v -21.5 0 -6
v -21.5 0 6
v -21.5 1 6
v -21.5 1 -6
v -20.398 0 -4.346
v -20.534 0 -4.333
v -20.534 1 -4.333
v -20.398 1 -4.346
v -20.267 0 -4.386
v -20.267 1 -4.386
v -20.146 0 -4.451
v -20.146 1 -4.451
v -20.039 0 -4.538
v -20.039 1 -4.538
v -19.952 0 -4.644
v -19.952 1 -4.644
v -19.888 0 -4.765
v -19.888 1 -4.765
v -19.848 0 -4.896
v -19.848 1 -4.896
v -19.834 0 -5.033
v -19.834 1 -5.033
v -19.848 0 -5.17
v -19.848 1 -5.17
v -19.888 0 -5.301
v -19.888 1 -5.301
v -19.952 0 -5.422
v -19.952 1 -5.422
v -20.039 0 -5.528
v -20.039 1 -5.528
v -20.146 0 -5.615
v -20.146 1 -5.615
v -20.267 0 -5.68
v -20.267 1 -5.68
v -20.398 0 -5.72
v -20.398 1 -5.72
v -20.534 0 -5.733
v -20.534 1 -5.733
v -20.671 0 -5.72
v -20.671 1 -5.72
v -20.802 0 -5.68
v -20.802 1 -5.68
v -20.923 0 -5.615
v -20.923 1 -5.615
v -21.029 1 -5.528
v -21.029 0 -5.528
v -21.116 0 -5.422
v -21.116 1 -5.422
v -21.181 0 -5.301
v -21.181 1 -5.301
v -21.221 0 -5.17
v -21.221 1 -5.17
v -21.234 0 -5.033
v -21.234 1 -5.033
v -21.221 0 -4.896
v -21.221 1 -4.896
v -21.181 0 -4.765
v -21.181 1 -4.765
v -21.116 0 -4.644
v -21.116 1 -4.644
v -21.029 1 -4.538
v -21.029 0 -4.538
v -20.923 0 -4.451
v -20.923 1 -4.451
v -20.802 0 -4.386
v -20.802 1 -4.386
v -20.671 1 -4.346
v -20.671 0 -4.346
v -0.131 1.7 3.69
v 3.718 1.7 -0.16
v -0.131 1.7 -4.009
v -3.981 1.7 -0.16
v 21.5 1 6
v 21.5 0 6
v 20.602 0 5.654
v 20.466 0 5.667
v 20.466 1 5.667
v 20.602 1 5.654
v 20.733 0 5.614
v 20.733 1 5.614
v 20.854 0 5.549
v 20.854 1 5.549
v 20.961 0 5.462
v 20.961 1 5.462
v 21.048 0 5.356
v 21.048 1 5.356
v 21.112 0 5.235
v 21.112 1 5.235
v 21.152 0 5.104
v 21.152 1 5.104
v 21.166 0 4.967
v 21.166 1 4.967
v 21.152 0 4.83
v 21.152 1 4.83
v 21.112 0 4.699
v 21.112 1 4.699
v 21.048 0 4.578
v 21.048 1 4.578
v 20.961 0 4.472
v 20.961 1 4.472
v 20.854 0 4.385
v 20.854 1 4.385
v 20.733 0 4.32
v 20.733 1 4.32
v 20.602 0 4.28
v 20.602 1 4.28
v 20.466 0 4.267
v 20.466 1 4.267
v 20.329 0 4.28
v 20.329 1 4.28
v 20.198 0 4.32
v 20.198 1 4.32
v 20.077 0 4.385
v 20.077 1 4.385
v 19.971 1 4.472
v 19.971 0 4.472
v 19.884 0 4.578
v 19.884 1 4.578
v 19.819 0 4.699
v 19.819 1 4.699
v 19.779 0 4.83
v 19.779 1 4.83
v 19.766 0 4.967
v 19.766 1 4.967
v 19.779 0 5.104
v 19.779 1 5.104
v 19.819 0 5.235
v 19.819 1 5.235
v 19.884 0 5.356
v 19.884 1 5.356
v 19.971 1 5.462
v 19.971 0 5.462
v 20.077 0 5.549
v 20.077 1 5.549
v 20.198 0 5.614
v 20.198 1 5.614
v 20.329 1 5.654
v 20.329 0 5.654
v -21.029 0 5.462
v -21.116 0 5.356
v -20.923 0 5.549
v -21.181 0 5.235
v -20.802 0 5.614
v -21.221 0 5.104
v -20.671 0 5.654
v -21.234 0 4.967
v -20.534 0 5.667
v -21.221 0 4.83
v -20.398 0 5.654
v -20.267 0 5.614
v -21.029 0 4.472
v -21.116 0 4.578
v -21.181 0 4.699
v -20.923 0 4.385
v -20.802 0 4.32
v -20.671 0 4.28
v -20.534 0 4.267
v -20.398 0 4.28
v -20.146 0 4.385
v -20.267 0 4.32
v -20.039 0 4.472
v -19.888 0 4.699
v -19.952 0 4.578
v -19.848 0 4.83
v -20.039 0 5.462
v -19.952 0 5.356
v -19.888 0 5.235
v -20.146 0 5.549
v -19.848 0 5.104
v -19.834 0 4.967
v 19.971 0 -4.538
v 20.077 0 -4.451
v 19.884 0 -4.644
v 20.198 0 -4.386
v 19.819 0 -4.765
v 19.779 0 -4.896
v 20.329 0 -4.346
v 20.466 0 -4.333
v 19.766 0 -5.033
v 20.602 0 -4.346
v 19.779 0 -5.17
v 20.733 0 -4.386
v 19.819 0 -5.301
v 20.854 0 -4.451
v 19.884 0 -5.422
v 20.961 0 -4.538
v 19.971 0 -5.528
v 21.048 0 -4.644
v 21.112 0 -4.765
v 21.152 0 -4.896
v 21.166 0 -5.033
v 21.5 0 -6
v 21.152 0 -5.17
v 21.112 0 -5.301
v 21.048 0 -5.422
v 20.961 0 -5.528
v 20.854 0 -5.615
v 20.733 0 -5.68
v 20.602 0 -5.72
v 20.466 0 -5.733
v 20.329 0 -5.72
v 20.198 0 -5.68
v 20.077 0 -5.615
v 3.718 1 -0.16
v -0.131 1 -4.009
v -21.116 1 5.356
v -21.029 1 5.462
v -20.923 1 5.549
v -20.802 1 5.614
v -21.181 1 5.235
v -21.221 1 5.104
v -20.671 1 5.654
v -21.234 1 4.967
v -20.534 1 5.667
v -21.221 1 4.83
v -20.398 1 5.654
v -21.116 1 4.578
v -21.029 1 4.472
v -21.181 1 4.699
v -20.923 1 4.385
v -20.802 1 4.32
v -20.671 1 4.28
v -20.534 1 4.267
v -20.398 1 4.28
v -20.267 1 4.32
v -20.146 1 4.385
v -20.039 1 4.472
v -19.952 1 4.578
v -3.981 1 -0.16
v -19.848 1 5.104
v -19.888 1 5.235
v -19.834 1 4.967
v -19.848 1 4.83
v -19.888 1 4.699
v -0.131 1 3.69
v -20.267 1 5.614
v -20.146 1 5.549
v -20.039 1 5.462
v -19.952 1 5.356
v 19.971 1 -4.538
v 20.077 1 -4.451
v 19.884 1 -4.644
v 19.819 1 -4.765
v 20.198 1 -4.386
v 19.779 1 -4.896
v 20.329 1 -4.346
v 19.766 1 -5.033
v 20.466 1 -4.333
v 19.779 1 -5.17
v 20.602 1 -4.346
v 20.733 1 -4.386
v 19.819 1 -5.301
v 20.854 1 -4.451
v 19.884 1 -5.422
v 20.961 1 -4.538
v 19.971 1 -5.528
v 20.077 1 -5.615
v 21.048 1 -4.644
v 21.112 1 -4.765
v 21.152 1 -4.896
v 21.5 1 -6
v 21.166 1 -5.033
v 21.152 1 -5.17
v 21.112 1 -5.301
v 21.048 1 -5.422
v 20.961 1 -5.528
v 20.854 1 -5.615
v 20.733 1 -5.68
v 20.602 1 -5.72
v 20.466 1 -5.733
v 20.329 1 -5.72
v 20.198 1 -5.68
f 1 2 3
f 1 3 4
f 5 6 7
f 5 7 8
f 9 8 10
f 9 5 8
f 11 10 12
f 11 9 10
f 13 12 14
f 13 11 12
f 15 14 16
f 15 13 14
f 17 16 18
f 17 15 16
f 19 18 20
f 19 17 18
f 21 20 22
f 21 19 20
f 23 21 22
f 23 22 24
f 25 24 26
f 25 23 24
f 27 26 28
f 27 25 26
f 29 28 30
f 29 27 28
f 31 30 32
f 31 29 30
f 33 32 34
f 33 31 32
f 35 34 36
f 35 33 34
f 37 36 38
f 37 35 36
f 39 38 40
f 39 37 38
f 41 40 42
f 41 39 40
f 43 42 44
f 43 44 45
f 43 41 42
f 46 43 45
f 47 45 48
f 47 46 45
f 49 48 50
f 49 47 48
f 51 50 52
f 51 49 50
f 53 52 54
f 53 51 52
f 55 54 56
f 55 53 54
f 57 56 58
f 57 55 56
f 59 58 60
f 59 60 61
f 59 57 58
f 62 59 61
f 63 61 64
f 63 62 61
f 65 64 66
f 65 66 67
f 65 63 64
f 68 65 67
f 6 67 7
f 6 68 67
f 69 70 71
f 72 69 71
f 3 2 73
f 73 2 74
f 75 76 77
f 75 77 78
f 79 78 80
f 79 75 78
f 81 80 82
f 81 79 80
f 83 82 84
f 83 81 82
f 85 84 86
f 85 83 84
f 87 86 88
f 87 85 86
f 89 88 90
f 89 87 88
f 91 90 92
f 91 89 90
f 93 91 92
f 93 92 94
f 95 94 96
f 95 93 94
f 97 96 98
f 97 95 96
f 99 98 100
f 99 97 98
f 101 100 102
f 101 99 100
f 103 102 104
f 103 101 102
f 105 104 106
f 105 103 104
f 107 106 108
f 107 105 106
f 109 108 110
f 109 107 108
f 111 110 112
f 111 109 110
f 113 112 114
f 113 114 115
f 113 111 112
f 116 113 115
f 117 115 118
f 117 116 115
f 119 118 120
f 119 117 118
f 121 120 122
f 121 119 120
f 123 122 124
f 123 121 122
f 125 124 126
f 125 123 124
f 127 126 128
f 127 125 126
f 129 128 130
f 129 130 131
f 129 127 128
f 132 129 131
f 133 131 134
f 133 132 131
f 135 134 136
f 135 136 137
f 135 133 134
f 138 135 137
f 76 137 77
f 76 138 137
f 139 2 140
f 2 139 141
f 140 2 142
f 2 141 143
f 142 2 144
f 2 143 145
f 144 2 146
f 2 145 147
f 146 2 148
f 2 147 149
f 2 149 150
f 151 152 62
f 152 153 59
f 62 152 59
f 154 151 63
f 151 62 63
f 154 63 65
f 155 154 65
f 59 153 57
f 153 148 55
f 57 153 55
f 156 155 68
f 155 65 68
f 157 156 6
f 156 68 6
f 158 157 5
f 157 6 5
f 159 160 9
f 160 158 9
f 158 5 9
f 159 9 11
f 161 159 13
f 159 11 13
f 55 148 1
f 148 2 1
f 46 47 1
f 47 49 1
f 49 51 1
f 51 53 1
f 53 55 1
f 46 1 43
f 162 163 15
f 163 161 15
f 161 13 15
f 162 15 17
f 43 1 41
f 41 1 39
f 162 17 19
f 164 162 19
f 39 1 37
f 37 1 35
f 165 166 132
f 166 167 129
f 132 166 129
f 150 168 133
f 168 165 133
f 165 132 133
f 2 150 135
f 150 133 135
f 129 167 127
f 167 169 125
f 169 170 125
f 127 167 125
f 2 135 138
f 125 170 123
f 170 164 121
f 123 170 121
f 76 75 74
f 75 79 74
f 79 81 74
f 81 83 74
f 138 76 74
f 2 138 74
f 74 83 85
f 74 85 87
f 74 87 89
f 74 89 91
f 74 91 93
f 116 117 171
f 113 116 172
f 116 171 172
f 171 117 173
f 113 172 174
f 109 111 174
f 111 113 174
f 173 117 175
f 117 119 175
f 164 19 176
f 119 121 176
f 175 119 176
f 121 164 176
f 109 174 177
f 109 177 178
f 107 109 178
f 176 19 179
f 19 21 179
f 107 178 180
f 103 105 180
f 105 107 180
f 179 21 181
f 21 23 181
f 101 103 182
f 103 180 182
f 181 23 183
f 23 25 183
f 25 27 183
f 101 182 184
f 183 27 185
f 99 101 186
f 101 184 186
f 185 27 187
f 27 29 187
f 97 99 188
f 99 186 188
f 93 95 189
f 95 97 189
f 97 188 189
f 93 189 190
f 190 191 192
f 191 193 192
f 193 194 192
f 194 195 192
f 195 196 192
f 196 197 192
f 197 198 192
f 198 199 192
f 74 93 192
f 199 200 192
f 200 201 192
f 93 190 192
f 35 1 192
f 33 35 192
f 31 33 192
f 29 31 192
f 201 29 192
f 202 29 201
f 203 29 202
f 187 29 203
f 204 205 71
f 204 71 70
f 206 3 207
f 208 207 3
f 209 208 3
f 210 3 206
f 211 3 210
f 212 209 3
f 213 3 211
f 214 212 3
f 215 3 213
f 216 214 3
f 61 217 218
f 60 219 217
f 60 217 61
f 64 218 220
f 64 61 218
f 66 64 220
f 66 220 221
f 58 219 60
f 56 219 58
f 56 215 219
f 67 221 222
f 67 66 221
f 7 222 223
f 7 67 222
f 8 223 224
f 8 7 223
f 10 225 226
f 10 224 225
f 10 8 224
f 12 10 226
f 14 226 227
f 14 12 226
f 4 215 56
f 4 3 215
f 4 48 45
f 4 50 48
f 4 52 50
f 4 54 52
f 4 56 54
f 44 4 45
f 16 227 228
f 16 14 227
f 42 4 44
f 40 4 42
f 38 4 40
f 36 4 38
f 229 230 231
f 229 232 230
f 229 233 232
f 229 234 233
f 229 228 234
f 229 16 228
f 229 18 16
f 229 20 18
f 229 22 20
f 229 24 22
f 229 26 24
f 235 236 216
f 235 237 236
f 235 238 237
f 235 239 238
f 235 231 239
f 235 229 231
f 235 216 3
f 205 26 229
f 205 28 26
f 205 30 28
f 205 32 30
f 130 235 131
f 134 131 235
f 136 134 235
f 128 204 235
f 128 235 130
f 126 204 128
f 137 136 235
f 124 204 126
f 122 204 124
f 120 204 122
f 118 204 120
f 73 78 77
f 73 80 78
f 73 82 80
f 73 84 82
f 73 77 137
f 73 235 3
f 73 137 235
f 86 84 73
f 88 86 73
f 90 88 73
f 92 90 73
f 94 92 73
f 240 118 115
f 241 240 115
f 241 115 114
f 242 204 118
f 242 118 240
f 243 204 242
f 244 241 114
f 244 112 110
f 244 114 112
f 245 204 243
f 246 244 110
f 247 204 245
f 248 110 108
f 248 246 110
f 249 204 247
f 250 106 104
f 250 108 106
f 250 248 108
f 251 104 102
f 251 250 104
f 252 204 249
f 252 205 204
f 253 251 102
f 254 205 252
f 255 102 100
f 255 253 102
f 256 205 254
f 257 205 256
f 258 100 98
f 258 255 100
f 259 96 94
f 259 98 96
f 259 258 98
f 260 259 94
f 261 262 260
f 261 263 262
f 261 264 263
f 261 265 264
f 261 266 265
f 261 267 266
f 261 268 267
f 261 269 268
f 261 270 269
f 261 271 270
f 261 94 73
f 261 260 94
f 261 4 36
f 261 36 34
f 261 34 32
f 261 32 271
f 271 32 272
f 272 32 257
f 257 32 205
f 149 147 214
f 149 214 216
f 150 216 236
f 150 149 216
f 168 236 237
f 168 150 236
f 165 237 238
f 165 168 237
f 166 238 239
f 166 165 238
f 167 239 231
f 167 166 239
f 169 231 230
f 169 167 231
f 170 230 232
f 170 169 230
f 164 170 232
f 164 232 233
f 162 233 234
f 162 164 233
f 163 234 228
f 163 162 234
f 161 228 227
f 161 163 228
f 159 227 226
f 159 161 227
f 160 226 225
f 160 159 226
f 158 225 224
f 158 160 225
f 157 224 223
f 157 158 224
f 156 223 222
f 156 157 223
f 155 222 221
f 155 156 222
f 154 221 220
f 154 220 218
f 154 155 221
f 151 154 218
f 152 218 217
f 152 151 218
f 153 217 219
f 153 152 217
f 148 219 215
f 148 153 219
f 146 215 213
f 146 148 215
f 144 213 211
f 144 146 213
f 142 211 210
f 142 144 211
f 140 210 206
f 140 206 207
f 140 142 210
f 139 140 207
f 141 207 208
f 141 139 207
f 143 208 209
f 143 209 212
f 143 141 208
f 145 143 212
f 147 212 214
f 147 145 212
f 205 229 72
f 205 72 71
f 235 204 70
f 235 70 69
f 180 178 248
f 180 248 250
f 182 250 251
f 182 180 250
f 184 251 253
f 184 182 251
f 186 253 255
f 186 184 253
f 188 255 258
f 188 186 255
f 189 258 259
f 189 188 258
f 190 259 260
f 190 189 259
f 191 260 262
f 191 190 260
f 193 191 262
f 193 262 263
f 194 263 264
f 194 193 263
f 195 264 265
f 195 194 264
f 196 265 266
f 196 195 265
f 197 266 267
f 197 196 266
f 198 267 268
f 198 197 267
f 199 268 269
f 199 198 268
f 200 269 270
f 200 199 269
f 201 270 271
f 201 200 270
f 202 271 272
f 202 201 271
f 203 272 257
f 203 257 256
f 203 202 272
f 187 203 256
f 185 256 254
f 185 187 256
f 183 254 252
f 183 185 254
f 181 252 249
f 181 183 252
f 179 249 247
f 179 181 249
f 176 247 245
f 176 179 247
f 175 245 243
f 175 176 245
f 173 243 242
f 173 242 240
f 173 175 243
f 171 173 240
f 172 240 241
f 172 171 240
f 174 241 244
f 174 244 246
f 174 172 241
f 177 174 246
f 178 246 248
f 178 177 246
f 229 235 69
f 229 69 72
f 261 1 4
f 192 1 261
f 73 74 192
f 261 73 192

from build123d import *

# Parameters (mm, degrees)
SKETCH1_W           = 43
SKETCH1_H           = 12
SKETCH1_R           = 0.7
BOSS_EXTRUDE1_DEPTH = 1
BOSS_EXTRUDE2_DEPTH = 0.7


with BuildPart() as part:
    # Sketch1 → Boss-Extrude1 (new body)
    with BuildSketch(Plane(origin=(0, 0, 0), x_dir=(1, 0, 0), z_dir=(0, 1, 0))):
        Rectangle(SKETCH1_W, SKETCH1_H)
        with Locations(Location((-20.534424833, -4.967025936, 0), (0, 0, 270))):
            Circle(SKETCH1_R, mode=Mode.SUBTRACT)
        with Locations(Location((20.465575167, -4.967025936, 0), (0, 0, 270))):
            Circle(SKETCH1_R, mode=Mode.SUBTRACT)
        with Locations(Location((20.465575167, 5.032974064, 0), (0, 0, 270))):
            Circle(SKETCH1_R, mode=Mode.SUBTRACT)
        with Locations(Location((-20.534424833, 5.032974064, 0), (0, 0, 270))):
            Circle(SKETCH1_R, mode=Mode.SUBTRACT)
    extrude(amount=BOSS_EXTRUDE1_DEPTH)

    # Sketch3 → Boss-Extrude2 (add)
    with BuildSketch(Plane(origin=(0, 1, 0), x_dir=(1, 0, 0), z_dir=(0, 1, 0))):
        Polygon((-3.980927617, 0.159893843), (-0.131379893, 4.009441567), (3.71816783, 0.159893843), (-0.131379893, -3.68965388), align=None)
    extrude(amount=BOSS_EXTRUDE2_DEPTH)


solid = part.part
